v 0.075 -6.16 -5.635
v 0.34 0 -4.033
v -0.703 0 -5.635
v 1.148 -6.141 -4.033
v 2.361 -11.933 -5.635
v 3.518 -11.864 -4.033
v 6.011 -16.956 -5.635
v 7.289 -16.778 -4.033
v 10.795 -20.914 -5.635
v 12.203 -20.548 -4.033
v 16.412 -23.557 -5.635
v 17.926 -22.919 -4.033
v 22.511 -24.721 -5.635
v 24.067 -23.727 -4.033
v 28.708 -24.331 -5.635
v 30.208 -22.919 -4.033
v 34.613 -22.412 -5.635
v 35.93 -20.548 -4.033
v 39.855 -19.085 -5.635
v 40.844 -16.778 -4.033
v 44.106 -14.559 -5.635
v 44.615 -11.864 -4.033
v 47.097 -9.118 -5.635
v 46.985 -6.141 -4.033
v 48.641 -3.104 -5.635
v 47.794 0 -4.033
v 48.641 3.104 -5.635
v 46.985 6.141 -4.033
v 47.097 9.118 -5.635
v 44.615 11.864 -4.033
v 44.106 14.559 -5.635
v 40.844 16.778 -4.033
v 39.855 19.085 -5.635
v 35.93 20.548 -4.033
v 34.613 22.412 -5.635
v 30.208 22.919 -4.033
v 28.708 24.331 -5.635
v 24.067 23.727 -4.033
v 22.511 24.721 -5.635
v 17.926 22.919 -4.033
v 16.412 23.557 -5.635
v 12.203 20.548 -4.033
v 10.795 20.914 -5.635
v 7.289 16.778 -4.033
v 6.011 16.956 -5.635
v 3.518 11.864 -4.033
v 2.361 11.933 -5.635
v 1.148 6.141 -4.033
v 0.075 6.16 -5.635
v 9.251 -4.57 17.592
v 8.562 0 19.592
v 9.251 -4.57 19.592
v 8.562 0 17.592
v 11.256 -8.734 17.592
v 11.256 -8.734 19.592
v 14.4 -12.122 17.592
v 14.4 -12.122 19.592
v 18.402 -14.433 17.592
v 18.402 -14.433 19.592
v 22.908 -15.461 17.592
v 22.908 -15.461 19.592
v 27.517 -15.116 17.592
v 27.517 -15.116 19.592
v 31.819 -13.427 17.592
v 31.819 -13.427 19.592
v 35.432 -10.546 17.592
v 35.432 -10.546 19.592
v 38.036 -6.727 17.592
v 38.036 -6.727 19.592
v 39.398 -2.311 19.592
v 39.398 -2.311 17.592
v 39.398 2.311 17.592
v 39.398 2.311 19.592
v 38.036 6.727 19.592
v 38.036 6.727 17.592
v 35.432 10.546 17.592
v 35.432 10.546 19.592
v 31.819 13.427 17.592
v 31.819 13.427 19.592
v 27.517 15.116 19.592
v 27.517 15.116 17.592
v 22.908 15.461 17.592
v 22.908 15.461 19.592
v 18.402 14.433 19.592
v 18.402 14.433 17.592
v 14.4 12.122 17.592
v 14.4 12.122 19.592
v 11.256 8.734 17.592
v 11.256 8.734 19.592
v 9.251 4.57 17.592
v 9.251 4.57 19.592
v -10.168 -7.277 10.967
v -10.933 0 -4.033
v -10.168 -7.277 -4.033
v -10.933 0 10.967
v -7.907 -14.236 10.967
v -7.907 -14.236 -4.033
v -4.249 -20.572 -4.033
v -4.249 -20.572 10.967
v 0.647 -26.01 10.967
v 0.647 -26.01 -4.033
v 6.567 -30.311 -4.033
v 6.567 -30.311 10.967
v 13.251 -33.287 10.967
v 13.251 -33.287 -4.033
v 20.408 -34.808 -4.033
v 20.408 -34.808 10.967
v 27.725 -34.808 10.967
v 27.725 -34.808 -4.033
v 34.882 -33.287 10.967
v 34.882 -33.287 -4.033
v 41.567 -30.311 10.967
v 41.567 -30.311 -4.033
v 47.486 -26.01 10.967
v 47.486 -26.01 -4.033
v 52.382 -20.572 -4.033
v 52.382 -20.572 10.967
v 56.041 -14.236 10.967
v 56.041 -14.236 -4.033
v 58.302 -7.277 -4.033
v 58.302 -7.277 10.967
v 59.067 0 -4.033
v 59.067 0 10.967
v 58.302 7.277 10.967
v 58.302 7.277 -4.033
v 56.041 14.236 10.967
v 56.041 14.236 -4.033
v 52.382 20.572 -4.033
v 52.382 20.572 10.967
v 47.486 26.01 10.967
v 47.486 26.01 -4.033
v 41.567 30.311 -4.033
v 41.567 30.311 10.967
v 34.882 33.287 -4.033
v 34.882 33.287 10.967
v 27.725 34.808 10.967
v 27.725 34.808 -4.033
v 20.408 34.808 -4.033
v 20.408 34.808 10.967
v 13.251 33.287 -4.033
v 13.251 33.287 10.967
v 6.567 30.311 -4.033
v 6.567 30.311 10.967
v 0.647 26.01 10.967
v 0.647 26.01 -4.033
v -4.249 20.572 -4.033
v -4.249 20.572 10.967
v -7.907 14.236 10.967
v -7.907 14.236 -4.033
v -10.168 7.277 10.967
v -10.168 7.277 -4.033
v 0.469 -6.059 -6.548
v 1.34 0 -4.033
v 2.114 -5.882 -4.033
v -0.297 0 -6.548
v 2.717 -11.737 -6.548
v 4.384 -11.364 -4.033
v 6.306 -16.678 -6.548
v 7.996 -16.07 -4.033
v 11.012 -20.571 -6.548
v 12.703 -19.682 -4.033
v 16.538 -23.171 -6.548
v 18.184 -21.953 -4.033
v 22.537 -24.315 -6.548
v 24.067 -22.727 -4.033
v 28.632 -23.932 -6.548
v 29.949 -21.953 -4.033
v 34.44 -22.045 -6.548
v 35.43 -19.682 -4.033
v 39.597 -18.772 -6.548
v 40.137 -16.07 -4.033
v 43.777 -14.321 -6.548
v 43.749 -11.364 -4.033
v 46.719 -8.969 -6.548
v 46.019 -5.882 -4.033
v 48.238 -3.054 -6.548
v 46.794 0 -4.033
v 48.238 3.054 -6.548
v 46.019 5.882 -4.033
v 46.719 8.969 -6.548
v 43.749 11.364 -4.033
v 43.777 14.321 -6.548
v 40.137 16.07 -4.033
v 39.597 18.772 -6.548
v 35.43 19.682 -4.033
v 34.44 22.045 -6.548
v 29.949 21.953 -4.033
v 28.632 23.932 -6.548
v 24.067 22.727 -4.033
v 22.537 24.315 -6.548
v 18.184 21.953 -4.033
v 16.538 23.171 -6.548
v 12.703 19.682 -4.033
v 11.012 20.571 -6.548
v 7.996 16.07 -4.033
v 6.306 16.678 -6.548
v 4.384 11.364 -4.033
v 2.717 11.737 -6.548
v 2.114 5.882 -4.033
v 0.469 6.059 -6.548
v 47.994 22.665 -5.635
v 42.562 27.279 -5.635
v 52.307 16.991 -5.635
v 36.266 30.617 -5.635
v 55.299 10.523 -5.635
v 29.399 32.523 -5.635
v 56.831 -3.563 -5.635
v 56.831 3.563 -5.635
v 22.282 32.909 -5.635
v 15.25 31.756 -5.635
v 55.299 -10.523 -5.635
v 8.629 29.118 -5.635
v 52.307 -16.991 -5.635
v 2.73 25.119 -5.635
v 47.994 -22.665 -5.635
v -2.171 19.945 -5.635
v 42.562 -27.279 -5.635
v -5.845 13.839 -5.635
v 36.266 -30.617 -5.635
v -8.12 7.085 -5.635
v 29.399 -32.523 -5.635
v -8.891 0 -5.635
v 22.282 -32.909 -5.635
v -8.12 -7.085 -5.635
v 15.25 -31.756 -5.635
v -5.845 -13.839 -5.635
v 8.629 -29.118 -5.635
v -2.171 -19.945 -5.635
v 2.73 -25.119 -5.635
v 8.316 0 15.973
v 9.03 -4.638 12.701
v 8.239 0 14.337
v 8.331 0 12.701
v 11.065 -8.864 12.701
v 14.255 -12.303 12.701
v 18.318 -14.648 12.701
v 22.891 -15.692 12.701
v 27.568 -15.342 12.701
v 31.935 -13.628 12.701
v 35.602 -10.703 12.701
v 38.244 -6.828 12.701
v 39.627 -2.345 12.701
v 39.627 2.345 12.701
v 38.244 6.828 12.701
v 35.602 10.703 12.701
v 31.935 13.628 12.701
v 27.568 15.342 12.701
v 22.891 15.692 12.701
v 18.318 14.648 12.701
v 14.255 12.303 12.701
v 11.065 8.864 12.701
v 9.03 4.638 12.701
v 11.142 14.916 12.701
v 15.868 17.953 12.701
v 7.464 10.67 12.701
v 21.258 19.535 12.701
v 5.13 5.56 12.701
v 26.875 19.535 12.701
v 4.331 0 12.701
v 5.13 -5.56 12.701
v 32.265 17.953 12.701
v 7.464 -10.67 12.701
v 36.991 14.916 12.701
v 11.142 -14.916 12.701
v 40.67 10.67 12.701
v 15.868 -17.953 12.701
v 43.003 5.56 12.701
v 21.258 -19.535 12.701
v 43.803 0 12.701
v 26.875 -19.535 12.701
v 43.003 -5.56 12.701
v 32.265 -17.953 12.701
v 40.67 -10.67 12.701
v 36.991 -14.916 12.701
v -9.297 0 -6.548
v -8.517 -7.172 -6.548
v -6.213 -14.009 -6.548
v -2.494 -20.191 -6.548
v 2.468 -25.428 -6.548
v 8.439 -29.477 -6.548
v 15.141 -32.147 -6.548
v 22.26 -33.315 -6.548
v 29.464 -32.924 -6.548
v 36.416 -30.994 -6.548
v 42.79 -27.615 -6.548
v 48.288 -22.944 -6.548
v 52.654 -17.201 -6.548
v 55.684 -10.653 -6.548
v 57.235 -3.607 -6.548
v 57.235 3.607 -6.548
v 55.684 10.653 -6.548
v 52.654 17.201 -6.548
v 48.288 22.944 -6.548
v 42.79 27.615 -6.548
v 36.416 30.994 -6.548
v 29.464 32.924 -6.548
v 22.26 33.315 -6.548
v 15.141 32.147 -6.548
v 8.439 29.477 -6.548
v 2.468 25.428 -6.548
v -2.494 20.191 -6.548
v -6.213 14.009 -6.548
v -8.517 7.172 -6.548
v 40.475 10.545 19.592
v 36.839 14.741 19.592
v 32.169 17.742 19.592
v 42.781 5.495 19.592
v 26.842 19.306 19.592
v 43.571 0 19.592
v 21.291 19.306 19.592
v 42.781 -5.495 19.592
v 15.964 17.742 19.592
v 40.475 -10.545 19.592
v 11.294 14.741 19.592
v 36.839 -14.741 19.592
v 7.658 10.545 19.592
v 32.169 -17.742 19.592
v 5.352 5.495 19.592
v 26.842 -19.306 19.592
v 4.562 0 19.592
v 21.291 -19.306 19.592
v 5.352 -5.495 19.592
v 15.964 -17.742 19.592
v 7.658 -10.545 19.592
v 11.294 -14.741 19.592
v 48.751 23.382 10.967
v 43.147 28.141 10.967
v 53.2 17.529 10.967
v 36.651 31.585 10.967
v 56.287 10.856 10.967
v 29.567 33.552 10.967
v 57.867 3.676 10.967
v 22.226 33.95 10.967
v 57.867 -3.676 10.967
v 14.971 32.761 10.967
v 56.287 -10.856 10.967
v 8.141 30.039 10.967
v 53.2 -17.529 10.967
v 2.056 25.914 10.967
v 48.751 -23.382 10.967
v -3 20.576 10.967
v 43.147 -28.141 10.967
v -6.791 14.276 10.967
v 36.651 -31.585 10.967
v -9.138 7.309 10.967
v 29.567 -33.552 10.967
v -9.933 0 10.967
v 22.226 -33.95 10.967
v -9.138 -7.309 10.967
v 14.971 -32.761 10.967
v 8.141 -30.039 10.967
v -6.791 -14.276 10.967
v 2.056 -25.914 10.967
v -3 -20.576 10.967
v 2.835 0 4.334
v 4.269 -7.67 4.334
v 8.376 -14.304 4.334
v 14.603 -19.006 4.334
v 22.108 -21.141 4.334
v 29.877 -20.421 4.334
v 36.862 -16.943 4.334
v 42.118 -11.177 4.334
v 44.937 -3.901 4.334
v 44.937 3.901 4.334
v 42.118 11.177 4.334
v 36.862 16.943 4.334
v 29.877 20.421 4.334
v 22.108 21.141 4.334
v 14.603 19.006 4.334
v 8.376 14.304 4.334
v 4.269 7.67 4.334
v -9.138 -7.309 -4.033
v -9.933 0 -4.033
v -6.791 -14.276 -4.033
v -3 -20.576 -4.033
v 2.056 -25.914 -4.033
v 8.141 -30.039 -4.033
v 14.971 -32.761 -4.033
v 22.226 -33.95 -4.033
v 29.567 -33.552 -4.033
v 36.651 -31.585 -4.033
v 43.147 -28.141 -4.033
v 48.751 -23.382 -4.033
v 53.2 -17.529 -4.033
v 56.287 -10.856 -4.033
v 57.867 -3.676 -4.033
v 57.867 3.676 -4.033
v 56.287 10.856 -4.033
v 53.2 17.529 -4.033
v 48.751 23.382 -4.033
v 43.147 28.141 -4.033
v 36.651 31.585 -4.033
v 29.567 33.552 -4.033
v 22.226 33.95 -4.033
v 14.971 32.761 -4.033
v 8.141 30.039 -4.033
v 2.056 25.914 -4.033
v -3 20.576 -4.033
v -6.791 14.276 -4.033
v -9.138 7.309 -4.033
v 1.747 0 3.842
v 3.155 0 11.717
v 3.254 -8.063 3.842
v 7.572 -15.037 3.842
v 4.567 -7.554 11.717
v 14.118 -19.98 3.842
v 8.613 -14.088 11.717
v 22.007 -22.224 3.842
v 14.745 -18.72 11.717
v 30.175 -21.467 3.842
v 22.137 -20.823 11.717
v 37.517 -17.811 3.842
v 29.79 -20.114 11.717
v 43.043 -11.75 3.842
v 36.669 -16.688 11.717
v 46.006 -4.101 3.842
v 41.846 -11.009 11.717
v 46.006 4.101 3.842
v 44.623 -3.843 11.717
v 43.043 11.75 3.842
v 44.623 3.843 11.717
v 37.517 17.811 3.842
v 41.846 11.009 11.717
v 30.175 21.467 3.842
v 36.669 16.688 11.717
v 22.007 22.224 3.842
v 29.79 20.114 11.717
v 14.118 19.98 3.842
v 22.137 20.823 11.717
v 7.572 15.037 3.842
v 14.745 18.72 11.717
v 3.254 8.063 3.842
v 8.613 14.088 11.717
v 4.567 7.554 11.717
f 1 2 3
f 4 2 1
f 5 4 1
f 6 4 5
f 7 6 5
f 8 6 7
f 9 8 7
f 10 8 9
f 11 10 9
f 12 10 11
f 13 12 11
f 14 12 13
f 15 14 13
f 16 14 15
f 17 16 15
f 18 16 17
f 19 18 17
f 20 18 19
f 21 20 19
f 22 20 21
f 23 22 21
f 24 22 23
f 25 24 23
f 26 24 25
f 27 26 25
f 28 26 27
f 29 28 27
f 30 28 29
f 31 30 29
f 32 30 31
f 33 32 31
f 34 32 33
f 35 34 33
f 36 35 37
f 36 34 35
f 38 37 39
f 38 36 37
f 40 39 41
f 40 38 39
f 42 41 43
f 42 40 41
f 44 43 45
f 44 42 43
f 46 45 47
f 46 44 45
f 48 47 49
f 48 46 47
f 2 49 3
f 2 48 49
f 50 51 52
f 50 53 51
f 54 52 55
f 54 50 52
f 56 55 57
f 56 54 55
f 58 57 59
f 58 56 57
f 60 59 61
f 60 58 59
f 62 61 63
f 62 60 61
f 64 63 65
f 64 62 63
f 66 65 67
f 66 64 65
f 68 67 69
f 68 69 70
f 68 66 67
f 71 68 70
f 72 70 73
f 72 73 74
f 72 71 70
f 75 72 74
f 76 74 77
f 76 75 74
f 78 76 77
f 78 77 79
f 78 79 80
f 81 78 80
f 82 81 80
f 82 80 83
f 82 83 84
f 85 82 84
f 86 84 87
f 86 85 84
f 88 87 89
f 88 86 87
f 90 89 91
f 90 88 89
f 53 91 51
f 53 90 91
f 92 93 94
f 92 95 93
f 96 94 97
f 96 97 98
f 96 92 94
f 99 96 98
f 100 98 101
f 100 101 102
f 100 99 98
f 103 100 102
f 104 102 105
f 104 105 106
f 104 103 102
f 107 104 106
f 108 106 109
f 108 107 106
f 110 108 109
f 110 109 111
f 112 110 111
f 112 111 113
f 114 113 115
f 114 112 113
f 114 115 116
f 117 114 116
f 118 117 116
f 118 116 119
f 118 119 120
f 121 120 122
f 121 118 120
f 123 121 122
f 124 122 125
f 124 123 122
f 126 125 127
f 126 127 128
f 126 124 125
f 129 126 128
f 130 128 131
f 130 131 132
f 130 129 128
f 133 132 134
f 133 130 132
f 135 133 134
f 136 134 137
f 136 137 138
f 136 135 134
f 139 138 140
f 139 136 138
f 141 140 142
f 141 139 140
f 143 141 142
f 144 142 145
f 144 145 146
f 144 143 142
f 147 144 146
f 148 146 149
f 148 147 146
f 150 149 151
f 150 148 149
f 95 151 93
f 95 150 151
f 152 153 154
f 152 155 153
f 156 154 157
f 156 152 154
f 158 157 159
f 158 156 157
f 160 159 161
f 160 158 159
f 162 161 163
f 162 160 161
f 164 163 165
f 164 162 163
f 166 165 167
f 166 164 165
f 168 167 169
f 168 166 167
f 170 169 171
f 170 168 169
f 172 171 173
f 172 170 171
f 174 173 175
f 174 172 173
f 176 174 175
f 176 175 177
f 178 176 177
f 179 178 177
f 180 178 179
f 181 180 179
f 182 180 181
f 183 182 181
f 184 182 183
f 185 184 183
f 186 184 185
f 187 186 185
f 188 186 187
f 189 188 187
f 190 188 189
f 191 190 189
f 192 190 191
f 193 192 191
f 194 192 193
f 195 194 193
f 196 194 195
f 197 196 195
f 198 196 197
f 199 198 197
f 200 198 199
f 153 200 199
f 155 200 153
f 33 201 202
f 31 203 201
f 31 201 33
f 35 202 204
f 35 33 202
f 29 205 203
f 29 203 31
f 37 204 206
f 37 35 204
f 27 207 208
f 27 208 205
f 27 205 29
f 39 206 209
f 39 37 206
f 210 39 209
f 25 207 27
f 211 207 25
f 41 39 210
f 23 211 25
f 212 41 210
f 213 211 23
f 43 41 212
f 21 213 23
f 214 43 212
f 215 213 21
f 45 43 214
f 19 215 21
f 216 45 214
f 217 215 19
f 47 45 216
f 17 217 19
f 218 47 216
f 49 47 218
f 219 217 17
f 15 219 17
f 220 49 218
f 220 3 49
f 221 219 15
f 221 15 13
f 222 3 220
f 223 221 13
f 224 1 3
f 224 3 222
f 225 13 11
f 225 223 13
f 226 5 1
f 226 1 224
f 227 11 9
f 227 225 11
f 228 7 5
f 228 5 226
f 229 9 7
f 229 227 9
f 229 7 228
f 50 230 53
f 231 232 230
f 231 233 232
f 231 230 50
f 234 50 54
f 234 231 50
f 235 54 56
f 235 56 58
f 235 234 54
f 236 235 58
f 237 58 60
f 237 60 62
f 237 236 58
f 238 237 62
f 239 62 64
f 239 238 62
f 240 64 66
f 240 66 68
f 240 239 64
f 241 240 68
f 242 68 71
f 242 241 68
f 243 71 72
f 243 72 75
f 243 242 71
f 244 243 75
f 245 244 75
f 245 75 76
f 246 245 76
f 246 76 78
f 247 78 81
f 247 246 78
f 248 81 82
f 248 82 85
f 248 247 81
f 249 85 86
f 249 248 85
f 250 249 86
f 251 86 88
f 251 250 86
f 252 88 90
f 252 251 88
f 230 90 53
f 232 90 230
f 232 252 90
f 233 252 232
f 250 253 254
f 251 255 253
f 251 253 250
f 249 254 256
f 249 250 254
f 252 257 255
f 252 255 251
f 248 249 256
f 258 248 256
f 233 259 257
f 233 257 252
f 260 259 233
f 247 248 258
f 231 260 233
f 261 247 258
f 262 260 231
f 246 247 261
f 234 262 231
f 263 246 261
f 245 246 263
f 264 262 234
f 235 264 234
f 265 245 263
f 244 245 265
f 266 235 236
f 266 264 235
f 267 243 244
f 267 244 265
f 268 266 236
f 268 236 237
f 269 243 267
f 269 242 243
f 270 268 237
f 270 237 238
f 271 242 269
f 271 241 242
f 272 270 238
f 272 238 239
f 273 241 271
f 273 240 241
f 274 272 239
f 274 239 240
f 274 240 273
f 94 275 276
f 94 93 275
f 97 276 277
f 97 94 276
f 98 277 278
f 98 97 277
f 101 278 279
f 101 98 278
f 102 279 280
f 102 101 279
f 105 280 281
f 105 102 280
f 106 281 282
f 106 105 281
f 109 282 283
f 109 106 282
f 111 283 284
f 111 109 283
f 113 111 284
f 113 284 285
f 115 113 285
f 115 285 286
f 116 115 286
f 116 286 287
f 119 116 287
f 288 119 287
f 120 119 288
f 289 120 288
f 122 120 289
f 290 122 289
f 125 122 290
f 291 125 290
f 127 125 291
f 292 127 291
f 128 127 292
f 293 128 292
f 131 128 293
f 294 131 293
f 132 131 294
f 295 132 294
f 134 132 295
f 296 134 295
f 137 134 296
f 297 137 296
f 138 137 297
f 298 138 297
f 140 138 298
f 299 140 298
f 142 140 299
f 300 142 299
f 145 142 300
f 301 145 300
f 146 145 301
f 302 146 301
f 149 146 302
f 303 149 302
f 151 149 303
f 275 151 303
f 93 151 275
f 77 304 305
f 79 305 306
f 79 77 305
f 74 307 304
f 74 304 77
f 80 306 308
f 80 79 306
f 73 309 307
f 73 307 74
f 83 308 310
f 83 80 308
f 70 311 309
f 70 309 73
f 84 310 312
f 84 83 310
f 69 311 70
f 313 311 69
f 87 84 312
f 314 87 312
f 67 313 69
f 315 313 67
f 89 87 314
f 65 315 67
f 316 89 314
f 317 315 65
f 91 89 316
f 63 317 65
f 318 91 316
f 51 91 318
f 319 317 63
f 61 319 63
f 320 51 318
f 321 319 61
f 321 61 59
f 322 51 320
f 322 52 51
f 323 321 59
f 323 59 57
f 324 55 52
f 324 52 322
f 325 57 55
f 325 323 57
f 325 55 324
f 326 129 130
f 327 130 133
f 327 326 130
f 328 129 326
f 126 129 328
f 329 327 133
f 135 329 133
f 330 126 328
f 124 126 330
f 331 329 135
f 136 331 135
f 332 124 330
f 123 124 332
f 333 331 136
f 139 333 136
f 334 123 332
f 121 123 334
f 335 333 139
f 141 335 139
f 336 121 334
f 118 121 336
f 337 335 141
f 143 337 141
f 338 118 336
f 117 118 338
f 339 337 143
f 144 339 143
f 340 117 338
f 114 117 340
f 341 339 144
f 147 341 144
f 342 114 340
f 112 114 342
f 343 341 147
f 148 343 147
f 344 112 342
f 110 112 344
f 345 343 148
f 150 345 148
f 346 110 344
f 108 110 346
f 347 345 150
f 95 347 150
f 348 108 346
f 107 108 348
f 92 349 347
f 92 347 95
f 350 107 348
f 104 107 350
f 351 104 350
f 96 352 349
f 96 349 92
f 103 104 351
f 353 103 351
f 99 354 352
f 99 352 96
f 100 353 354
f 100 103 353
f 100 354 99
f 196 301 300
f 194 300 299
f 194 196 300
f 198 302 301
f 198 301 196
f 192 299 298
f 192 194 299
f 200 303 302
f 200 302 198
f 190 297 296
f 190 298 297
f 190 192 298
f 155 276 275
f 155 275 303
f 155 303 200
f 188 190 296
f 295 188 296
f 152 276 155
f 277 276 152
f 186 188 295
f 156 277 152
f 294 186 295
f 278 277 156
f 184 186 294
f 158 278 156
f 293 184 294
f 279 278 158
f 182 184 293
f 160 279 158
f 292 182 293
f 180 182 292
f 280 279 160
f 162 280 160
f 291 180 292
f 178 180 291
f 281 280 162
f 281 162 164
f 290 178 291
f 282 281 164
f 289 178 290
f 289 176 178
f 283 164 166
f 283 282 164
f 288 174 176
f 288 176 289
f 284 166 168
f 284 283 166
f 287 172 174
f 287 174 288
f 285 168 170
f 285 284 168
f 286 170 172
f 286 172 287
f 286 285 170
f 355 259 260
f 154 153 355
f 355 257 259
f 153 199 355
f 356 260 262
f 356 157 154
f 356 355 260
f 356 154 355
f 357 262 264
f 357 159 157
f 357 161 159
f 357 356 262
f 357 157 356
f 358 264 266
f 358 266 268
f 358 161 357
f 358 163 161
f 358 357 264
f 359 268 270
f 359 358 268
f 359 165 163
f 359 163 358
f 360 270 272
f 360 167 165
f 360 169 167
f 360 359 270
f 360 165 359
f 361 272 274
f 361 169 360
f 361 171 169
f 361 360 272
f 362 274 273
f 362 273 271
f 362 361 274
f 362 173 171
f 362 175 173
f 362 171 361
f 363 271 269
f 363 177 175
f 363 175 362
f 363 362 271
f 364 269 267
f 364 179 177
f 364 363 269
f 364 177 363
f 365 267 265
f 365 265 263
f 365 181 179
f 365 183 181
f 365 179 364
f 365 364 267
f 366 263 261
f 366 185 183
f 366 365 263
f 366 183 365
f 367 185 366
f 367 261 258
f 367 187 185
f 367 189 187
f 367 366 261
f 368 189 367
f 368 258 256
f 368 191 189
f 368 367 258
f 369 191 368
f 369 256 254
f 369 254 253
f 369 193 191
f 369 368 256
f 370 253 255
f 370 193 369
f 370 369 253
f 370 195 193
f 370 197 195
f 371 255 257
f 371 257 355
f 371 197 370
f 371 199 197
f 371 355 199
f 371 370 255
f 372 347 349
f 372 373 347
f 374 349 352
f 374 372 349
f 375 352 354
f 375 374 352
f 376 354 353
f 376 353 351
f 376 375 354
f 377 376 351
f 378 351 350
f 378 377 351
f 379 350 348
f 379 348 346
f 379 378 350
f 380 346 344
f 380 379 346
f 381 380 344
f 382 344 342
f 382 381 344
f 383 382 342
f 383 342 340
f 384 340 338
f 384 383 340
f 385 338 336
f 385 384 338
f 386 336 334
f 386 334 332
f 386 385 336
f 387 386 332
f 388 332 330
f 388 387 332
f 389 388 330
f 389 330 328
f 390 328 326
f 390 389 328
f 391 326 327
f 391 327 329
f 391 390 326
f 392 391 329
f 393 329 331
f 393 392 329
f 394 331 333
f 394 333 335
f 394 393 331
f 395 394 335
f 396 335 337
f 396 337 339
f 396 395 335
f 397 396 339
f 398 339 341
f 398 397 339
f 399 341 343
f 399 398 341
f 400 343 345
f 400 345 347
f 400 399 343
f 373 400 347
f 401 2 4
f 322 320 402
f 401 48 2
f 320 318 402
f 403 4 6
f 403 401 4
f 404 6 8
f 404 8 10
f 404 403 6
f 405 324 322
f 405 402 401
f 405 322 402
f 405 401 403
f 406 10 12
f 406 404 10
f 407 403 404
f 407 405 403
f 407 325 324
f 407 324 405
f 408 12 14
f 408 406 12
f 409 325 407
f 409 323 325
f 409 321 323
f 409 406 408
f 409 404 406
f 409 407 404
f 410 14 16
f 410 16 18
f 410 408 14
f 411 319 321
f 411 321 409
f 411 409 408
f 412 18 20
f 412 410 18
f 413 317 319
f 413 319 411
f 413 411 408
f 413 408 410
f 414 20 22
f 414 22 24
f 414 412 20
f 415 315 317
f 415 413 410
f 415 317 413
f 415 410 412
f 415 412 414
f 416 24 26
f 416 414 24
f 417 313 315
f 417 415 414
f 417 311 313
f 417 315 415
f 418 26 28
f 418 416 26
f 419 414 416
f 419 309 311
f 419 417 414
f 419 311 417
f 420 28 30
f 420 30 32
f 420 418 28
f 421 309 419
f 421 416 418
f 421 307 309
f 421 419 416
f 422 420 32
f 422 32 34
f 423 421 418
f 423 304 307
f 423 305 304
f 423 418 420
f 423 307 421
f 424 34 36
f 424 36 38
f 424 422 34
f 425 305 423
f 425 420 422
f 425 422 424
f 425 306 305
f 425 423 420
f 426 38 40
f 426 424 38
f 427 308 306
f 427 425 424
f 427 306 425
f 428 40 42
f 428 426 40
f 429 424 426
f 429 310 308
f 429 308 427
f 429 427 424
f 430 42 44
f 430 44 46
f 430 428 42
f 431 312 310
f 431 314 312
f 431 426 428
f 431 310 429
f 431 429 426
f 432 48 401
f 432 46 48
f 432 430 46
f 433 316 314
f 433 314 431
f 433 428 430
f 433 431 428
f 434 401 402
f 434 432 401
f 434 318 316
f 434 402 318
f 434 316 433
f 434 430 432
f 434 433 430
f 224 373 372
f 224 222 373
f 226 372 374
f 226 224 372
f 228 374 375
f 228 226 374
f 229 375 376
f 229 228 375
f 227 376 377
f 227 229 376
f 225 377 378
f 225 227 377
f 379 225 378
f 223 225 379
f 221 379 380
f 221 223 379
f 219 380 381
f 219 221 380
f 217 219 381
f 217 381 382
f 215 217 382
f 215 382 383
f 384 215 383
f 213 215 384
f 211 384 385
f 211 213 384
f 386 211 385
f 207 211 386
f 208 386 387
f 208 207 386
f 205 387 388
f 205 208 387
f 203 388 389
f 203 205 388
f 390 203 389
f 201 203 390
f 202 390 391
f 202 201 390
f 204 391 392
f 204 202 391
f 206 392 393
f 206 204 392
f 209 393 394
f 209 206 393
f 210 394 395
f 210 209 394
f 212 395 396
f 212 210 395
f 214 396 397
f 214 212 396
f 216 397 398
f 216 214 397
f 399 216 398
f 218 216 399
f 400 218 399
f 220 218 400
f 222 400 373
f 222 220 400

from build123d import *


with BuildPart() as part:
    # Sketch4 → Revolve1 (revolve)
    with BuildSketch(Plane(origin=(0, 0, 0), x_dir=(1, 0, 0), z_dir=(0, 1, 0))):
        with BuildLine():
            Line((-10.933333333, -10.966666667), (-9.933333333, -10.966666667))
            Line((-9.933333333, -10.966666667), (-9.933333333, 4.033333333))
            Line((-9.933333333, 4.033333333), (-8.890939345, 5.63491013))
            Line((-8.890939345, 5.63491013), (-0.702775901, 5.63491013))
            Line((-0.702775901, 5.63491013), (0.339618087, 4.033333333))
            Line((0.339618087, 4.033333333), (4.562176814, -19.592288305))
            Line((4.562176814, -19.592288305), (8.562176814, -19.592288305))
            Line((8.562176814, -19.592288305), (8.562176814, -17.592288305))
            ThreePointArc((8.562176814, -17.592288305), (8.256127983, -15.155893912), (8.330597185, -12.701481994))
            Line((8.330597185, -12.701481994), (4.330597185, -12.701481994))
            Line((4.330597185, -12.701481994), (1.339618087, 4.033333333))
            Line((1.339618087, 4.033333333), (-0.296857623, 6.547681609))
            Line((-0.296857623, 6.547681609), (-9.296857623, 6.547681609))
            Line((-9.296857623, 6.547681609), (-10.933333333, 4.033333333))
            Line((-10.933333333, 4.033333333), (-10.933333333, -10.966666667))
        make_face()
    revolve(axis=Axis((24.066666667, 0, -10.345988756), (0, 0, 1)))


solid = part.part
